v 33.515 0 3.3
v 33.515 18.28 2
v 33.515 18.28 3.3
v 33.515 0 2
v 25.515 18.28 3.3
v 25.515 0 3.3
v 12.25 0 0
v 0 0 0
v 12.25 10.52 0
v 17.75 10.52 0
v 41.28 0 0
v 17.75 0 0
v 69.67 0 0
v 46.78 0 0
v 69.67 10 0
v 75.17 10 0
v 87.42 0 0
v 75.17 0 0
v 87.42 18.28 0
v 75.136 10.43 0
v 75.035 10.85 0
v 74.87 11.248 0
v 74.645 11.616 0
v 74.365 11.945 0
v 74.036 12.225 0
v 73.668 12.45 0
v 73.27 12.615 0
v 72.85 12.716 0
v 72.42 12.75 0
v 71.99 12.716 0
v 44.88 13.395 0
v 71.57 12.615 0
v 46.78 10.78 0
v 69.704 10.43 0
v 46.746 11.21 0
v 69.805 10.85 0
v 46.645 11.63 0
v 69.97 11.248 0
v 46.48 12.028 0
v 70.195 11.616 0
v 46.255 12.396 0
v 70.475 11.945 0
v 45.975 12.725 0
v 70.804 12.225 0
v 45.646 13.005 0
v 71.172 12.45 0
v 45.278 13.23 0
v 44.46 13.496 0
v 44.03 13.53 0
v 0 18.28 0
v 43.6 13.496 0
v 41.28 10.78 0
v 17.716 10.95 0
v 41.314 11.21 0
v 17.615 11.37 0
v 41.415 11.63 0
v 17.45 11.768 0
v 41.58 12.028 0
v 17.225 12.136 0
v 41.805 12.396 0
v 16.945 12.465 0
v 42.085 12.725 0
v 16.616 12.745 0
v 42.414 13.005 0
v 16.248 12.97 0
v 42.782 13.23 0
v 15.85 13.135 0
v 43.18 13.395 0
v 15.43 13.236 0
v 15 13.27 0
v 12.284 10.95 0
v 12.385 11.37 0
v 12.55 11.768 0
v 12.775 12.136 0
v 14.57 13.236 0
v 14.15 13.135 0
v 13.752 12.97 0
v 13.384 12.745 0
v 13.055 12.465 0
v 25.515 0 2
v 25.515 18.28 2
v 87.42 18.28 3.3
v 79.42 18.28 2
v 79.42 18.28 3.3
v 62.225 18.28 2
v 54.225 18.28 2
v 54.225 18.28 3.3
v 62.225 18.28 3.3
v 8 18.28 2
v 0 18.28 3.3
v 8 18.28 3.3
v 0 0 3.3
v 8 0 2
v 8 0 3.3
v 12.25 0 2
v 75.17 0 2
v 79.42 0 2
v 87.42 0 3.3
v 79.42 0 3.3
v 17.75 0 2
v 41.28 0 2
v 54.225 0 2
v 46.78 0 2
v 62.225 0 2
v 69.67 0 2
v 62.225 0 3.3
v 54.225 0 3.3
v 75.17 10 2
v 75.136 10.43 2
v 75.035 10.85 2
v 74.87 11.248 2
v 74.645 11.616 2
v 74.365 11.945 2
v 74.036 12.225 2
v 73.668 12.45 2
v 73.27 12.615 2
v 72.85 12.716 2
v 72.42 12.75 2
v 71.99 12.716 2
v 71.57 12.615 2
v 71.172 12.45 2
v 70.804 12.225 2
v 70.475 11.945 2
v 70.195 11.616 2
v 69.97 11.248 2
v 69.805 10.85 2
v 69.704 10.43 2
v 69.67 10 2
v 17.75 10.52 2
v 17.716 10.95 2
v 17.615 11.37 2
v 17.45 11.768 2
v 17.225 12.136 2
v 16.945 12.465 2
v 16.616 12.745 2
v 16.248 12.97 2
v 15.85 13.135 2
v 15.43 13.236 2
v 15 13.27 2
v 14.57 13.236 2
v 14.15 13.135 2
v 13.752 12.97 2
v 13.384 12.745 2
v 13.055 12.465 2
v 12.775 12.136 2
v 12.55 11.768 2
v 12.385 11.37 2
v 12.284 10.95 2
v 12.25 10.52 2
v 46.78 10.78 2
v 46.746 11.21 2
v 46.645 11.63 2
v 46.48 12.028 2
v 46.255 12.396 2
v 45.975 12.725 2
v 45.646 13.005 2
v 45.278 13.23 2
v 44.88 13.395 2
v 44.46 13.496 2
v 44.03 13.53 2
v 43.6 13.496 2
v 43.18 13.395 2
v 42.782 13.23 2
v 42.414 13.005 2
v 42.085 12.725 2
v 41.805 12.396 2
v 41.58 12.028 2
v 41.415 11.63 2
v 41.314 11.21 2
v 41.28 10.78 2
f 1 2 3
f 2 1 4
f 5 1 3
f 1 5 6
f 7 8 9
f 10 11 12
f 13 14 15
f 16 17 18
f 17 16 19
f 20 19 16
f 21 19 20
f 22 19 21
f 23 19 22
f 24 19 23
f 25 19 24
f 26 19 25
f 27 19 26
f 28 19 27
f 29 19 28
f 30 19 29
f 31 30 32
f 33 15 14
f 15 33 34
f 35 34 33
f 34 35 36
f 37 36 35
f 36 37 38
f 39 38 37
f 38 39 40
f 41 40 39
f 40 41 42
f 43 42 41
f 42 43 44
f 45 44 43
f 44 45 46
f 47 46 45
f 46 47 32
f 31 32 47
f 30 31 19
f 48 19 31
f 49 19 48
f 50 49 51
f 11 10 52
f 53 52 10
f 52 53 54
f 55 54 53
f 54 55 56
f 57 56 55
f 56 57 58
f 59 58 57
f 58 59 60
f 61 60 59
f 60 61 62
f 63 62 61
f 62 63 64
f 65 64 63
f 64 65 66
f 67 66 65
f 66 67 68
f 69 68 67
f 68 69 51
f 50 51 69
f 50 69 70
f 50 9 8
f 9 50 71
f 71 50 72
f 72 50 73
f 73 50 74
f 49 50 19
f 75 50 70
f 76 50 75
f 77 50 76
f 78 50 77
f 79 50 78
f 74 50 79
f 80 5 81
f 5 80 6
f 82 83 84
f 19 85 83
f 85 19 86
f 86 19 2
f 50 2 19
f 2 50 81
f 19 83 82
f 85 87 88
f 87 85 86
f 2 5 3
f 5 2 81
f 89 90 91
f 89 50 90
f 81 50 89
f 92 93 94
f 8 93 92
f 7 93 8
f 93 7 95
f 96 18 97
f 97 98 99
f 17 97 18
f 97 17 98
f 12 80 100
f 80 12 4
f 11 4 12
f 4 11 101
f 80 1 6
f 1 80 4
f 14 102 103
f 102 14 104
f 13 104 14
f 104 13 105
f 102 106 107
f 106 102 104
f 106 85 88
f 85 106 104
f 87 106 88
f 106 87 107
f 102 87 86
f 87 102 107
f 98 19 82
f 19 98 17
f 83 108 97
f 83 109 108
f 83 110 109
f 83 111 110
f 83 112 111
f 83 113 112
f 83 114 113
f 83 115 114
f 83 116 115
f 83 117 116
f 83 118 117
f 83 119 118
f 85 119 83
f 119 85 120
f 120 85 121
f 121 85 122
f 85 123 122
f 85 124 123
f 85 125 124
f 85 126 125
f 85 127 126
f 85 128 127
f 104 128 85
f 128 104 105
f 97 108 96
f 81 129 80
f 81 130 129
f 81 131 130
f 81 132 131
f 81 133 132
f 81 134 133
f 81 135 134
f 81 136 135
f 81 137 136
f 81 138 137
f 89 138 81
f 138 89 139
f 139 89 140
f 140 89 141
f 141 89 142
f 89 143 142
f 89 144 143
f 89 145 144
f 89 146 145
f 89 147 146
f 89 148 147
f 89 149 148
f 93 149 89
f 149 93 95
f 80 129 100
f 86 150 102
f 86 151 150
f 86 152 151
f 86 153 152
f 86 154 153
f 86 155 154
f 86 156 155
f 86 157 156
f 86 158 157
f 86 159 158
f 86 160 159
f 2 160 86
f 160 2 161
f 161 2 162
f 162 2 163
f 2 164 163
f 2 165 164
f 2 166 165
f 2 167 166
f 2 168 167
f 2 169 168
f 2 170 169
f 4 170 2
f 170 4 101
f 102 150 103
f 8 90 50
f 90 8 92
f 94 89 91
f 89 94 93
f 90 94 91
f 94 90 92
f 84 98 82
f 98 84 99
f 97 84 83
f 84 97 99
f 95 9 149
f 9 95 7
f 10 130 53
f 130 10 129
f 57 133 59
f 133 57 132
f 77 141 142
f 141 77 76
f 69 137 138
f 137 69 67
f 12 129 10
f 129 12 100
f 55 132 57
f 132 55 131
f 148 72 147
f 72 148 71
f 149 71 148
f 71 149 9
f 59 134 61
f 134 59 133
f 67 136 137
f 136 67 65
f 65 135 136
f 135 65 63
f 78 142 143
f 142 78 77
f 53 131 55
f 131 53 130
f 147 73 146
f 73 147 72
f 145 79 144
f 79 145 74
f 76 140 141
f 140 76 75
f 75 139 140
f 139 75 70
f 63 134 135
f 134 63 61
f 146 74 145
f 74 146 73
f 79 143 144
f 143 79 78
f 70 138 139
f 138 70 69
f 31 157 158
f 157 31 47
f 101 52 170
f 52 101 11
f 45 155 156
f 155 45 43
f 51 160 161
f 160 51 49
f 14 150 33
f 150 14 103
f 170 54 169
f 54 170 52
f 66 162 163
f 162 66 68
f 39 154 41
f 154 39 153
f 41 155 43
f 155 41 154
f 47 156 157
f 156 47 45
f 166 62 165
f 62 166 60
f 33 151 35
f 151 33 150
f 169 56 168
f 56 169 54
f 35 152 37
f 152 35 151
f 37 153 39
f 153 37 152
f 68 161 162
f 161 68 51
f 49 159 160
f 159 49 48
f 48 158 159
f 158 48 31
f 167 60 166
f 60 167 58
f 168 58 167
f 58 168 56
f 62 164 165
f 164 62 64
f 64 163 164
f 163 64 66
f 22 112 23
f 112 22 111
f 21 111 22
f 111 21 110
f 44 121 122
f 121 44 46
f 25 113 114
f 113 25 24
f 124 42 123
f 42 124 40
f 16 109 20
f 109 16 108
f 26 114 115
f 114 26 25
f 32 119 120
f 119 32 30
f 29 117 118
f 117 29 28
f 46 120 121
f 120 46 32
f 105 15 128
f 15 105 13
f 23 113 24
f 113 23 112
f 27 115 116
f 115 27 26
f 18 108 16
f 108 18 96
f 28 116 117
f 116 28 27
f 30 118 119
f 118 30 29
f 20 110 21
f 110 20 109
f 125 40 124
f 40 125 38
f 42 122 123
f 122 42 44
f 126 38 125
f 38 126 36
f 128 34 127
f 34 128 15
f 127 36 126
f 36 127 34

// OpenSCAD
// ============================================================
// Train_ctrl_esp32_dev - enclosure
// ============================================================
// VERSION 8.6   (see VERSION below - echoed to the console on every
//                render and engraved on the underside of the base)
//
// CHANGELOG
//  v1.0  first draft: separate PCB standoffs and lid bosses, 3 mm LEDs.
//        (Superseded - standoffs and bosses collided at the corners.)
//  v2.0  corner holes became stepped combo posts (PCB + lid screw in
//        one); fixed USB slot not reaching the outer wall face.
//  v3.0  8 mm LED holes, 4 desk-mounting ears, lid inset into the box
//        with a 45-degree bevel, corner-hole inset as parameters.
//  v4.0  version number (echo + engraved), every part in its own color
//        (incl. the M2 posts), fixed "unknown variable CASE_EXT_Y"
//        warning (EAR_Y_POSITIONS was defined before the value it uses).
//  v5.0  FIX: the v2-v4 stepped corner post could not be assembled - its
//        upper fat section sat above the neck, so the PCB's 2 mm hole could
//        never pass over it. Lid screws are now separate bosses in the
//        corners of a box made longer (EXTRA_Y each end), clear of the PCB.
//        The PCB sits on 6 plain M2 standoffs (4 corners + 2 inner).
//        Desk ears reduced from 4 to 2, one centered on each side wall.
//  v6.0  DXF no longer used: every position is now a plain PCB-local number
//        you can edit directly. Corner-hole Y inset 3 -> 4. PCB standoffs
//        5 -> 10 mm tall and 4.5 -> 7 mm wide (the whole box is 5 mm taller;
//        all side-hole heights follow STANDOFF_HEIGHT). Both left-wall holes
//        (DC in + voltmeter tap) are now the same, larger size (9.5 mm).
//  v7.0  all M2 holes in the box (6 PCB standoffs + 4 lid bosses) are now
//        sized for M2 heat-set threaded inserts (previously small pilot
//        holes for screwing straight into the plastic): INSERT_* parameters
//        and an entry chamfer for the displaced plastic.
//  v8.0  (superseded by 8.1 - connector shapes were misread) round DC holes,
//        wider DC wall, panel micro-USB cutout + screws. Added: 30 mm
//        voltmeter hole in the lid, "hole test" plate.
//  v8.1  CORRECTION. DC jack holes are RECTANGLES, 9 wide x 12 tall (+0.4 mm
//        print clearance), resting on the PCB; the jack sticks 3 mm out past
//        the PCB edge, which is exactly WALL + MARGIN, so its front face is
//        flush with the wall's outside (box back to 126 mm wide). The USB
//        POWER INPUT is a single ROUND hole (measured 10.6 mm).
//        PART = "usb_hole_test" prints a plate with 4 holes
//        (10.4 / 10.6 / 10.8 / 11.0 mm) to pick the production size.
//        Kept from 8.0: 30 mm voltmeter hole in the lid.
//        TBD: programming over USB (see note at the USB parameters).
//        No on/off switch: power is switched on the external USB supply.
//  v8.2  TEST-FIT CORRECTIONS (PCB placed in the printed v8.1 box):
//        - both DC jack holes moved 4 mm toward the motor-out jack (+Y)
//        - the two PCB standoffs next to the DC wall moved 2 mm away from
//          that wall (+X) and 0.5 mm toward the DC-in side (-Y)
//        - FLIP_Y_FEATURES: the DXF is a MIRROR IMAGE of the real top view
//          (checked against the test-fit photo), so the DXF-derived Y
//          positions of the inner standoffs, the LEDs and the USB hole
//          were flipped end-for-end. Set FLIP_Y_FEATURES = false to undo.
//  v8.3  - the two PCB standoffs next to the DC wall, ADDITIONAL correction on
//          top of v8.2 (viewed from the USB wall looking at the DC wall):
//          2 mm to the right (+Y, toward the motor-out jack) and 0.5 mm back
//          toward the box center (+X). Totals vs v8.1: +2.5 mm in X, +1.5 mm in Y.
//        - box 20 mm taller (CLEARANCE_ABOVE_PCB 15 -> 35) for the voltmeter.
//          NOTE: the 8 mm LEDs now sit about 20 mm below the lid holes - they
//          need long leads or light pipes to reach up to the holes.
//        Other M2 positions: still TBD.
//  v8.4  - USB opening is now a RECTANGLE, 12 wide x 9 tall (was a 10.8 mm
//          round hole), centered 5 mm higher than the old round hole, so a
//          USB-C plug can go straight into the ESP32's socket, which sits
//          very close to the wall.
//        - ventilation holes at the motor driver (VENT_* parameters): 6 holes
//          through the front/back walls and 2 through the side walls. Cut
//          through the WALLS only, not through the standoffs inside.
//  v8.5  - LED retainer strip (PART = "led_strip"): ONE printed strip, glued
//          under the lid, that holds all 3 LEDs so they cannot be pushed
//          down. See the LED_FLANGE_* / STRIP_* parameters.
//  v8.6  - LED strip: two more glue pads, one between each pair of LEDs (4 in
//          total), for a stronger bond.
// ============================================================
// Two parts:
//  - base: open box with 2 desk-mounting ears, 6 PCB standoffs, 4 lid-screw
//    bosses (in the extra length beyond the PCB), and a 45-degree bevel
//    around the top opening.
//  - lid : flat plate with a matching 45-degree bevel. It sits INSIDE
//    the opening, flush with the rim, so from outside you see only the
//    top face and a thin diagonal seam - no thick wall line.
//
// PCB and lid are fastened independently:
//  - The PCB sits on 6 plain standoffs matching its M2 holes (4 corners +
//    2 inner). Each standoff takes an M2 heat-set insert, flush with its
//    top; an M2 screw goes down through the PCB hole into the insert.
//    Do this before the lid.
//  - The lid is held by 4 bosses in the corners of the extra length
//    (EXTRA_Y) added at each end of the box, so they never touch the PCB.
//    Each takes an M2 heat-set insert; M2 screws go down through the lid.
//  - Screws: M2 x 5 or M2 x 6 (PCB 1.6 mm / lid 2.4 mm + insert length).
//
// DIMENSIONS
//  Everything is a plain number in mm - edit freely. PCB-local coordinates
//  have their origin at the board's bottom-left corner (X along the 120 mm
//  side, Y along the 94 mm side). The DXF is no longer used: the inner
//  holes, LEDs and connector positions below were frozen from the last
//  DXF-based version (v5) and are now yours to tune.
//
// Other flagged assumptions (search "ASSUMPTION" / "CHECK"):
//  - CLEARANCE_ABOVE_PCB, USB_Z (height of the USB hole).
//  - JACK_CLEARANCE: the 9 x 12 jack holes get +0.4 mm so the housing slides
//    in after printing. Set it to 0 for the exact size.
//  - USB hole size: pick it with the PART = "usb_hole_test" plate.

// ============================================================
// GENERATE MODEL
// ============================================================
PART = "led_strip";       // "case" = box + lid + LED strip;  "led_strip" = the LED strip only;  "usb_hole_test" = round-hole test plate
ASSEMBLED = false;   // true = everything shown in place (lid on the base, strip under the lid); false = print layout
echo(str("train_ctrl_esp32_dev_case  v", VERSION, "  part=", PART));

if (PART == "usb_hole_test") {
    usb_hole_test();
} else if (PART == "led_strip") {
    led_strip();
} else {
    base();
    if (ASSEMBLED) {
        translate([0, 0, WALL + WALL_HEIGHT]) lid();
        translate([STRIP_X0, STRIP_Y0, WALL + WALL_HEIGHT - STRIP_T - STRIP_GAP_BELOW_LID]) led_strip();
    } else {
        // Lid flipped top-face-down (smooth visible face on the bed, bevel
        // faces up so nothing overhangs), placed beside the base.
        translate([0, 2 * CASE_EXT_Y + 15, LID_THICKNESS])
            rotate([180, 0, 0])
                lid();
        // LED strip, flat on the bed (glue pads face up - no supports needed).
        translate([0, 2 * CASE_EXT_Y + 30, 0])
            led_strip();
    }
}

// ============================================================
// PARAMETERS
// ============================================================

VERSION = "8.6";
ENGRAVE_VERSION = true;   // engrave "v<VERSION>" on the underside of the floor
ENGRAVE_DEPTH = 0.6;

// ---- Part colors (preview / 3MF only - no effect on printing) ----
C_SHELL     = "SlateGray";
C_LID       = "SteelBlue";
C_LIDBOSS   = "OrangeRed";   // 4 lid-screw bosses
C_STANDOFF  = "Gold";        // 6 PCB M2 standoffs (4 corners + 2 inner)
C_EAR       = "SeaGreen";    // desk-mounting ears
C_TEST      = "Orange";      // USB hole test plate
C_STRIP     = "MediumPurple"; // LED retainer strip

// ---- Board ----
BOARD_X = 120;
BOARD_Y = 94;
PCB_THICKNESS = 1.6;

// Corner M2 holes: center distance from the board edges
CORNER_INSET_X = 3;
CORNER_INSET_Y = 4;

// ---- Test-fit corrections (v8.2), all in mm ----
DC_HOLES_SHIFT_Y = 4;              // both DC jack holes: toward the motor-out jack (+Y)
DC_SIDE_STANDOFF_SHIFT_X = 2 + 0.5;  // the 2 PCB holes next to the DC wall: away from that wall (+X). v8.2: +2, v8.3: +0.5 more
DC_SIDE_STANDOFF_SHIFT_Y = -0.5 + 2; // ...along the wall (+Y = toward the motor-out jack). v8.2: -0.5, v8.3: +2 more
FLIP_Y_FEATURES = true;            // DXF is mirrored vs the real board: flip inner holes, LEDs, USB along Y.
                                    // CHECK: with the PCB in the box, the two inner PCB holes (not at a
                                    // corner) should line up with the two inner standoffs. If they already
                                    // lined up in the v8.1 box, set this to false.

// ---- DC jacks (both on the left wall) ----
JACK_OVERHANG = 3;        // measured: jack front face sticks out this far past the PCB edge
JACK_HEIGHT = 12;         // measured: body height; it rests on the PCB
JACK_WIDTH = 9;           // measured: body width (along the wall)
JACK_CLEARANCE = 0.4;     // added to width and height of the wall hole (print tolerance); 0 = exact size

// ---- Construction ----
WALL = 2;               // side wall / floor thickness
MARGIN = 1;              // clearance between PCB edge and inner wall face (all sides except DC)
MARGIN_DC_SIDE = JACK_OVERHANG - WALL;   // PCB edge -> inner face of the LEFT (DC) wall. The jacks
                                          // stick out JACK_OVERHANG past the PCB, so with this their
                                          // front faces end flush with the wall's outside and the
                                          // housing sits in a rectangular pocket through the wall.
LID_THICKNESS = 2.4;     // lid plate
LID_BEVEL = 1.0;         // 45-degree bevel size, lid + opening (wall rim keeps WALL - LID_BEVEL flat)
LID_GAP = 0.2;           // clearance between lid and opening (visible seam width)
STANDOFF_HEIGHT = 10;    // floor to PCB underside (box height follows this)
STANDOFF_OD = 7;         // PCB standoffs (all 6)

// ---- M2 heat-set insert holes (used by ALL 10 M2 holes in the box) ----
// Defaults follow a typical M2 insert spec: ~3.5 mm OD, 3-5 mm long, 3.2 mm hole,
// blind hole >= 1 mm deeper than the insert (room for the displaced plastic).
// Holes print slightly SMALLER than modeled - print one standoff as a test and
// adjust INSERT_HOLE_D to your insert (the insert should push in with light
// pressure and the melt should not squeeze out underneath).
INSERT_HOLE_D = 3.2;      // check your insert's datasheet
INSERT_LENGTH = 4;        // e.g. M2 x 4
INSERT_HOLE_DEPTH = INSERT_LENGTH + 1;
INSERT_CHAMFER = 0.4;     // 45-degree lead-in; catches plastic pushed up around the insert
                          // so the PCB / lid still sits flat on the standoff / boss

EXTRA_Y = 8;             // extra length added at EACH end (Y) so the lid bosses sit beyond
                          // the PCB. Only Y: the DC jack and USB are on the X walls and
                          // must stay close to them.

CLEARANCE_ABOVE_PCB = 15 + 20;  // PCB top to lid underside. Was 15; +20 mm for the height of the voltmeter.
                                 // (An 8 mm LED stands roughly 10-12 mm tall, the ESP32 on its headers about
                                 // as much - the voltmeter is now the tallest part.)

// Lid-screw bosses (4, in the corners of the extra length)
LID_BOSS_OD = 6;
LID_SCREW_CLEARANCE_D = 2.4;

// ---- Derived ----
PCB_OFFSET_X = WALL + MARGIN_DC_SIDE;       // PCB-local (0,0) -> case coords
PCB_OFFSET_Y = WALL + MARGIN + EXTRA_Y;
CASE_EXT_X = BOARD_X + (WALL + MARGIN_DC_SIDE) + (WALL + MARGIN);
CASE_EXT_Y = BOARD_Y + 2 * PCB_OFFSET_Y;
BOSS_INSET = WALL + LID_BOSS_OD / 2 - 0.3;  // boss center from the outer edges; fused 0.3 mm into the walls
IX = CASE_EXT_X - 2 * WALL;     // inner cavity
IY = CASE_EXT_Y - 2 * WALL;
WALL_HEIGHT = STANDOFF_HEIGHT + PCB_THICKNESS + CLEARANCE_ABOVE_PCB; // floor top -> lid underside
SHELL_H = WALL + WALL_HEIGHT + LID_THICKNESS;                        // total base height

// ---- Desk-mounting ears (2x: one centered on each side wall, flat at floor level) ----
// (defined AFTER the derived sizes above: top-level variables cannot reference later ones)
EAR_THICKNESS = 3;
EAR_LENGTH = 16;           // protrusion beyond the wall face
EAR_WIDTH = 14;
EAR_HOLE_D = 4.5;          // M4 / #8 screw clearance
EAR_Y_POSITIONS = [CASE_EXT_Y / 2];       // one ear per side wall, centered


// ---- Layout (PCB-local mm, origin = bottom-left corner of the board) ----
// PCB-local positions
corner_mount_holes = [
    [CORNER_INSET_X + DC_SIDE_STANDOFF_SHIFT_X,  CORNER_INSET_Y + DC_SIDE_STANDOFF_SHIFT_Y],   // next to the DC wall
    [BOARD_X - CORNER_INSET_X,                   CORNER_INSET_Y],
    [BOARD_X - CORNER_INSET_X,                   BOARD_Y - CORNER_INSET_Y],
    [CORNER_INSET_X + DC_SIDE_STANDOFF_SHIFT_X,  BOARD_Y - CORNER_INSET_Y + DC_SIDE_STANDOFF_SHIFT_Y],   // next to the DC wall
];

// The DXF is a mirror image of the real top view, so Y positions taken from it are flipped
// end-for-end (BOARD_Y - y) when FLIP_Y_FEATURES is true.
function fy(y) = FLIP_Y_FEATURES ? BOARD_Y - y : y;
lid_boss_xy = [
    [BOSS_INSET,               BOSS_INSET],
    [CASE_EXT_X - BOSS_INSET,  BOSS_INSET],
    [CASE_EXT_X - BOSS_INSET,  CASE_EXT_Y - BOSS_INSET],
    [BOSS_INSET,               CASE_EXT_Y - BOSS_INSET],
];
inner_mount_holes = [ for (p = [[39.67, 60.03], [51.23, 20.76]]) [p[0], fy(p[1])] ];
led_holes         = [ for (p = [[44.04, 83.87], [73.07, 83.61], [101.46, 84.39]]) [p[0], fy(p[1])] ];

LED_HOLE_D = 8.4;   // 8 mm LED + clearance for print tolerance

// ---- Voltmeter hole in the lid ----
VOLT_HOLE_D = 30;
VOLT_X = led_holes[1][0];     // centered under the MIDDLE LED (PCB-local X)...
VOLT_Y = BOARD_Y / 2;         // ...and in the middle of the PCB top-to-bottom (PCB-local Y)
                               // (use BOARD_X / 2 for VOLT_X if you want it at the exact PCB center)

// ---- LED retainer strip (v8.5) ----
// The LEDs are pushed up through the lid holes from below until their base flange meets the lid.
// This strip slides sideways in UNDER the three flanges (each lead slot is open at the front
// edge) and its two end pads are glued to the underside of the lid. The flange is then trapped
// between the lid (above) and the strip (below): the LED can't be pushed down or pulled out.
LED_FLANGE_D = 9.0;       // CHECK with calipers: the wide ring at the base of your 8 mm LEDs
LED_FLANGE_T = 1.0;       // CHECK: thickness of that ring
STRIP_FIT = 0.3;          // clearance between the flange and the lid / the strip
STRIP_T = 2.0;            // strip thickness
STRIP_SLOT_W = 5.5;       // lead slot width - must be clearly narrower than the flange
STRIP_PAD_L = 8;          // glue pad length at each end
STRIP_MID_PAD_L = 8;      // length of the 2 extra glue pads, one midway between each pair of LEDs
STRIP_MARGIN = 7;         // LED center to the start of a glue pad (x), must be >= flange radius + 2
STRIP_FRONT = 10;         // front edge of the strip, this far in front of the LEDs (slots open here)
STRIP_BACK = 3;           // strip material behind the flange
STRIP_GAP_BELOW_LID = LED_FLANGE_T + STRIP_FIT;   // top of the strip is this far below the lid underside

// ---- DC jack holes, left wall: RECTANGLES, 9 wide x 12 tall, resting on the PCB ----
DC_HOLE_W = JACK_WIDTH + JACK_CLEARANCE;             // along the wall
DC_HOLE_H = JACK_HEIGHT + JACK_CLEARANCE;            // vertical
DC_IN_Y = 77.51 + DC_HOLES_SHIFT_Y;                  // PCB-local Y of the hole center. NOTE: on the real board this (higher-Y) hole
                                                      // lines up with the MOTOR-OUT jack and the lower one with DC-in; both holes are identical.
DC_IN_Z = STANDOFF_HEIGHT + PCB_THICKNESS + JACK_HEIGHT / 2;   // jack sits on the PCB -> center is half its height up

CN2_Y = 14.41 + DC_HOLES_SHIFT_Y;                     // second jack hole (lines up with the DC-in jack on the real board)
CN2_Z = STANDOFF_HEIGHT + PCB_THICKNESS + JACK_HEIGHT / 2;

// ---- USB power input, right wall: RECTANGULAR opening, 12 wide x 9 tall ----
// Big enough for a USB-C plug with its overmold to go straight into the ESP32's socket
// (the socket sits very close to the wall). Exact size - no print clearance added.
// POWER ONLY for now. TBD: programming through this socket - needs a data-capable cable
// (check the one you have) and access to the devkit's BOOT/EN buttons if it needs them.
USB_HOLE_W = 12;                                      // along the wall
USB_HOLE_H = 9;                                       // vertical
USB_TEST_DIAMETERS = [10.4, 10.6, 10.8, 11.0];        // only for PART = "usb_hole_test" (round-hole test plate)
USB_Y = fy(65.91);                                    // PCB-local Y of the opening center (flipped like the other DXF positions)
USB_Z = STANDOFF_HEIGHT + PCB_THICKNESS + 9 + 5;      // opening center above the PCB: the old round hole was +9, now +5 higher

// ---- Ventilation holes (motor driver area), CASE coordinates in mm ----
// Same positions as the holes added in the test copy. Each set is cut straight through the box.
VENT_FB_X = [20, 40];          // front/back walls (cut along Y): X positions...
VENT_FB_Z = [10, 25, 40];      // ...and heights above the box bottom
VENT_FB_D = 6;                 // diameter (your code had 8 here; 6 as you said)
VENT_SIDE_Y = [100, 90];       // side walls (cut along X, through the left AND right wall): Y positions...
VENT_SIDE_Z = 40;              // ...and height
VENT_SIDE_D = 6;

// Strip extents in CASE coordinates (derived from the LED hole positions)
LEDS_X = [ for (p = led_holes) PCB_OFFSET_X + p[0] ];
LEDS_Y = [ for (p = led_holes) PCB_OFFSET_Y + p[1] ];
STRIP_X0 = min(LEDS_X) - STRIP_MARGIN - STRIP_PAD_L;
STRIP_X1 = max(LEDS_X) + STRIP_MARGIN + STRIP_PAD_L;
STRIP_Y0 = min(LEDS_Y) - STRIP_FRONT;
STRIP_Y1 = max(LEDS_Y) + LED_FLANGE_D / 2 + STRIP_BACK;

EPS = 0.2;

// ============================================================
// MODULES
// ============================================================

// Negative volume for one M2 heat-set insert, opening upward at local z = top.
// Flat-bottomed blind hole (3D printing) with a 45-degree entry chamfer.
module insert_hole(top) {
    translate([0, 0, top - INSERT_HOLE_DEPTH]) {
        cylinder(h = INSERT_HOLE_DEPTH + EPS, d = INSERT_HOLE_D, $fn = 32);
        translate([0, 0, INSERT_HOLE_DEPTH - INSERT_CHAMFER])
            cylinder(h = INSERT_CHAMFER + EPS, d1 = INSERT_HOLE_D,
                     d2 = INSERT_HOLE_D + 2 * (INSERT_CHAMFER + EPS), $fn = 32);
    }
}

module plain_standoff() {
    difference() {
        cylinder(h = STANDOFF_HEIGHT, d = STANDOFF_OD, $fn = 48);
        insert_hole(STANDOFF_HEIGHT);
    }
}

// Lid-screw boss: full height floor -> lid underside, pilot hole in the top.
// Local z=0 is the floor's top surface.
module lid_boss() {
    difference() {
        cylinder(h = WALL_HEIGHT, d = LID_BOSS_OD, $fn = 48);
        insert_hole(WALL_HEIGHT);
    }
}

// Test plate: one hole per size in USB_TEST_DIAMETERS, same thickness as the box wall.
// Round-hole test plate. The USB opening is rectangular now, so this is only for testing
// other round holes - set the sizes in USB_TEST_DIAMETERS.
module usb_hole_test() {
    n = len(USB_TEST_DIAMETERS);
    pitch = 16;
    edge = 8;
    plate_w = (n - 1) * pitch + 2 * edge;
    plate_h = 26;
    color(C_TEST)
        difference() {
            cube([plate_w, plate_h, WALL]);
            for (i = [0 : n - 1]) {
                translate([edge + i * pitch, 15, -EPS])
                    cylinder(h = WALL + 2 * EPS, d = USB_TEST_DIAMETERS[i], $fn = 64);
                translate([edge + i * pitch, 4.5, WALL - 0.6])
                    linear_extrude(0.7)
                        text(str(USB_TEST_DIAMETERS[i]), size = 3.2, halign = "center", valign = "center");
            }
        }
}

// LED retainer strip, in its own local frame: origin at its front-left bottom corner,
// bottom face on z = 0. Glue pads rise from the top face; in the assembled position their
// tops touch the underside of the lid and the strip's middle part sits STRIP_GAP_BELOW_LID below it.
module led_strip() {
    w = STRIP_X1 - STRIP_X0;
    d = STRIP_Y1 - STRIP_Y0;
    color(C_STRIP)
        difference() {
            union() {
                cube([w, d, STRIP_T]);
                cube([STRIP_PAD_L, d, STRIP_T + STRIP_GAP_BELOW_LID]);                    // left glue pad
                translate([w - STRIP_PAD_L, 0, 0])
                    cube([STRIP_PAD_L, d, STRIP_T + STRIP_GAP_BELOW_LID]);                // right glue pad
                // extra glue pads midway between neighbouring LEDs (LEDS_X is in ascending order)
                for (i = [0 : len(LEDS_X) - 2])
                    translate([(LEDS_X[i] + LEDS_X[i + 1]) / 2 - STRIP_X0 - STRIP_MID_PAD_L / 2, 0, 0])
                        cube([STRIP_MID_PAD_L, d, STRIP_T + STRIP_GAP_BELOW_LID]);
            }
            // one lead slot per LED, open at the front edge, rounded end centered on the LED
            for (i = [0 : len(LEDS_X) - 1])
                hull() {
                    translate([LEDS_X[i] - STRIP_X0, LEDS_Y[i] - STRIP_Y0, -EPS])
                        cylinder(h = STRIP_T + STRIP_GAP_BELOW_LID + 2 * EPS, d = STRIP_SLOT_W, $fn = 40);
                    translate([LEDS_X[i] - STRIP_X0, -1, -EPS])
                        cylinder(h = STRIP_T + STRIP_GAP_BELOW_LID + 2 * EPS, d = STRIP_SLOT_W, $fn = 40);
                }
        }
}

// Desk-mount ear pointing toward -X from the wall face at x=0,
// base at z=0. Mirror it for the right side.
module mounting_ear() {
    hole_x = EAR_LENGTH - EAR_WIDTH / 2;
    difference() {
        hull() {
            translate([0.5, -EAR_WIDTH / 2, 0])
                cube([WALL - 0.5, EAR_WIDTH, EAR_THICKNESS]);   // overlaps into the wall
            translate([-hole_x, 0, 0])
                cylinder(h = EAR_THICKNESS, d = EAR_WIDTH, $fn = 48);
        }
        translate([-hole_x, 0, -EPS])
            cylinder(h = EAR_THICKNESS + 2 * EPS, d = EAR_HOLE_D, $fn = 32);
    }
}

module base() {
    color(C_SHELL) shell();

    // PCB standoffs: all 6 holes (4 corners + 2 inner)
    color(C_STANDOFF)
        for (p = concat(corner_mount_holes, inner_mount_holes))
            translate([PCB_OFFSET_X + p[0], PCB_OFFSET_Y + p[1], WALL])
                plain_standoff();

    // Lid-screw bosses, in the extra length beyond the PCB
    color(C_LIDBOSS)
        for (p = lid_boss_xy)
            translate([p[0], p[1], WALL])
                lid_boss();

    // Desk-mounting ears, both side walls
    color(C_EAR)
        for (y = EAR_Y_POSITIONS) {
            translate([0, y, 0]) mounting_ear();
            translate([CASE_EXT_X, y, 0]) mirror([1, 0, 0]) mounting_ear();
        }
}

module shell() {
    difference() {
        cube([CASE_EXT_X, CASE_EXT_Y, SHELL_H]);

        // Cavity (open top)
        translate([WALL, WALL, WALL])
            cube([IX, IY, WALL_HEIGHT + LID_THICKNESS + EPS]);

        // 45-degree bevel around the top opening. Runs a hair past the
        // rim (EPS) while keeping the same slope, so the cut is clean.
        hull() {
            translate([WALL, WALL, SHELL_H - LID_BEVEL])
                cube([IX, IY, 0.01]);
            translate([WALL - LID_BEVEL - EPS, WALL - LID_BEVEL - EPS, SHELL_H + EPS])
                cube([IX + 2 * (LID_BEVEL + EPS), IY + 2 * (LID_BEVEL + EPS), 0.01]);
        }

        // Left wall: DC_IN + CN2, rectangular pockets for the jack housings
        translate([-EPS, PCB_OFFSET_Y + DC_IN_Y - DC_HOLE_W / 2, WALL + DC_IN_Z - DC_HOLE_H / 2])
            cube([WALL + 2 * EPS, DC_HOLE_W, DC_HOLE_H]);
        translate([-EPS, PCB_OFFSET_Y + CN2_Y - DC_HOLE_W / 2, WALL + CN2_Z - DC_HOLE_H / 2])
            cube([WALL + 2 * EPS, DC_HOLE_W, DC_HOLE_H]);

        // Right wall: rectangular USB opening
        translate([CASE_EXT_X - WALL - EPS, PCB_OFFSET_Y + USB_Y - USB_HOLE_W / 2, WALL + USB_Z - USB_HOLE_H / 2])
            cube([WALL + 2 * EPS, USB_HOLE_W, USB_HOLE_H]);

        // Ventilation holes. Cut in the SHELL only, so they open the walls but do not slice
        // through the standoffs and lid bosses inside (one of the holes at x = 40, z = 10 would
        // otherwise cut the inner standoff).
        for (x = VENT_FB_X)
            for (z = VENT_FB_Z)
                translate([x, -EPS, z])
                    rotate([-90, 0, 0])
                        cylinder(h = CASE_EXT_Y + 2 * EPS, d = VENT_FB_D, $fn = 40);
        for (y = VENT_SIDE_Y)
            translate([-EPS, y, VENT_SIDE_Z])
                rotate([0, 90, 0])
                    cylinder(h = CASE_EXT_X + 2 * EPS, d = VENT_SIDE_D, $fn = 40);

        // Version number, engraved into the underside of the floor.
        // Mirrored in X so it reads correctly when the base is flipped over.
        if (ENGRAVE_VERSION)
            translate([CASE_EXT_X / 2, CASE_EXT_Y / 2, -EPS])
                mirror([1, 0, 0])
                    linear_extrude(ENGRAVE_DEPTH + EPS)
                        text(str("v", VERSION), size = 6, halign = "center", valign = "center");
    }
}

// Lid in assembled orientation: z=0 is its underside, z=LID_THICKNESS its
// visible top face. XY uses the same case coordinates as base().
module lid() {
    color(C_LID) lid_body();
}

module lid_body() {
    lx = WALL + LID_GAP;                  // lower body, inset by the fit gap
    ly = WALL + LID_GAP;
    lw = IX - 2 * LID_GAP;
    ld = IY - 2 * LID_GAP;
    straight_h = LID_THICKNESS - LID_BEVEL;

    difference() {
        union() {
            // straight lower body
            translate([lx, ly, 0])
                cube([lw, ld, straight_h + 0.01]);
            // 45-degree bevel, widening to the visible top face
            hull() {
                translate([lx, ly, straight_h])
                    cube([lw, ld, 0.01]);
                translate([lx - LID_BEVEL, ly - LID_BEVEL, LID_THICKNESS - 0.01])
                    cube([lw + 2 * LID_BEVEL, ld + 2 * LID_BEVEL, 0.01]);
            }
        }

        // 8 mm LED holes
        for (p = led_holes)
            translate([PCB_OFFSET_X + p[0], PCB_OFFSET_Y + p[1], -EPS])
                cylinder(h = LID_THICKNESS + 2 * EPS, d = LED_HOLE_D, $fn = 48);

        // Voltmeter hole
        translate([PCB_OFFSET_X + VOLT_X, PCB_OFFSET_Y + VOLT_Y, -EPS])
            cylinder(h = LID_THICKNESS + 2 * EPS, d = VOLT_HOLE_D, $fn = 96);

        // Lid screw clearance holes over the 4 lid bosses
        for (p = lid_boss_xy)
            translate([p[0], p[1], -EPS])
                cylinder(h = LID_THICKNESS + 2 * EPS, d = LID_SCREW_CLEARANCE_D, $fn = 16);
    }
}
